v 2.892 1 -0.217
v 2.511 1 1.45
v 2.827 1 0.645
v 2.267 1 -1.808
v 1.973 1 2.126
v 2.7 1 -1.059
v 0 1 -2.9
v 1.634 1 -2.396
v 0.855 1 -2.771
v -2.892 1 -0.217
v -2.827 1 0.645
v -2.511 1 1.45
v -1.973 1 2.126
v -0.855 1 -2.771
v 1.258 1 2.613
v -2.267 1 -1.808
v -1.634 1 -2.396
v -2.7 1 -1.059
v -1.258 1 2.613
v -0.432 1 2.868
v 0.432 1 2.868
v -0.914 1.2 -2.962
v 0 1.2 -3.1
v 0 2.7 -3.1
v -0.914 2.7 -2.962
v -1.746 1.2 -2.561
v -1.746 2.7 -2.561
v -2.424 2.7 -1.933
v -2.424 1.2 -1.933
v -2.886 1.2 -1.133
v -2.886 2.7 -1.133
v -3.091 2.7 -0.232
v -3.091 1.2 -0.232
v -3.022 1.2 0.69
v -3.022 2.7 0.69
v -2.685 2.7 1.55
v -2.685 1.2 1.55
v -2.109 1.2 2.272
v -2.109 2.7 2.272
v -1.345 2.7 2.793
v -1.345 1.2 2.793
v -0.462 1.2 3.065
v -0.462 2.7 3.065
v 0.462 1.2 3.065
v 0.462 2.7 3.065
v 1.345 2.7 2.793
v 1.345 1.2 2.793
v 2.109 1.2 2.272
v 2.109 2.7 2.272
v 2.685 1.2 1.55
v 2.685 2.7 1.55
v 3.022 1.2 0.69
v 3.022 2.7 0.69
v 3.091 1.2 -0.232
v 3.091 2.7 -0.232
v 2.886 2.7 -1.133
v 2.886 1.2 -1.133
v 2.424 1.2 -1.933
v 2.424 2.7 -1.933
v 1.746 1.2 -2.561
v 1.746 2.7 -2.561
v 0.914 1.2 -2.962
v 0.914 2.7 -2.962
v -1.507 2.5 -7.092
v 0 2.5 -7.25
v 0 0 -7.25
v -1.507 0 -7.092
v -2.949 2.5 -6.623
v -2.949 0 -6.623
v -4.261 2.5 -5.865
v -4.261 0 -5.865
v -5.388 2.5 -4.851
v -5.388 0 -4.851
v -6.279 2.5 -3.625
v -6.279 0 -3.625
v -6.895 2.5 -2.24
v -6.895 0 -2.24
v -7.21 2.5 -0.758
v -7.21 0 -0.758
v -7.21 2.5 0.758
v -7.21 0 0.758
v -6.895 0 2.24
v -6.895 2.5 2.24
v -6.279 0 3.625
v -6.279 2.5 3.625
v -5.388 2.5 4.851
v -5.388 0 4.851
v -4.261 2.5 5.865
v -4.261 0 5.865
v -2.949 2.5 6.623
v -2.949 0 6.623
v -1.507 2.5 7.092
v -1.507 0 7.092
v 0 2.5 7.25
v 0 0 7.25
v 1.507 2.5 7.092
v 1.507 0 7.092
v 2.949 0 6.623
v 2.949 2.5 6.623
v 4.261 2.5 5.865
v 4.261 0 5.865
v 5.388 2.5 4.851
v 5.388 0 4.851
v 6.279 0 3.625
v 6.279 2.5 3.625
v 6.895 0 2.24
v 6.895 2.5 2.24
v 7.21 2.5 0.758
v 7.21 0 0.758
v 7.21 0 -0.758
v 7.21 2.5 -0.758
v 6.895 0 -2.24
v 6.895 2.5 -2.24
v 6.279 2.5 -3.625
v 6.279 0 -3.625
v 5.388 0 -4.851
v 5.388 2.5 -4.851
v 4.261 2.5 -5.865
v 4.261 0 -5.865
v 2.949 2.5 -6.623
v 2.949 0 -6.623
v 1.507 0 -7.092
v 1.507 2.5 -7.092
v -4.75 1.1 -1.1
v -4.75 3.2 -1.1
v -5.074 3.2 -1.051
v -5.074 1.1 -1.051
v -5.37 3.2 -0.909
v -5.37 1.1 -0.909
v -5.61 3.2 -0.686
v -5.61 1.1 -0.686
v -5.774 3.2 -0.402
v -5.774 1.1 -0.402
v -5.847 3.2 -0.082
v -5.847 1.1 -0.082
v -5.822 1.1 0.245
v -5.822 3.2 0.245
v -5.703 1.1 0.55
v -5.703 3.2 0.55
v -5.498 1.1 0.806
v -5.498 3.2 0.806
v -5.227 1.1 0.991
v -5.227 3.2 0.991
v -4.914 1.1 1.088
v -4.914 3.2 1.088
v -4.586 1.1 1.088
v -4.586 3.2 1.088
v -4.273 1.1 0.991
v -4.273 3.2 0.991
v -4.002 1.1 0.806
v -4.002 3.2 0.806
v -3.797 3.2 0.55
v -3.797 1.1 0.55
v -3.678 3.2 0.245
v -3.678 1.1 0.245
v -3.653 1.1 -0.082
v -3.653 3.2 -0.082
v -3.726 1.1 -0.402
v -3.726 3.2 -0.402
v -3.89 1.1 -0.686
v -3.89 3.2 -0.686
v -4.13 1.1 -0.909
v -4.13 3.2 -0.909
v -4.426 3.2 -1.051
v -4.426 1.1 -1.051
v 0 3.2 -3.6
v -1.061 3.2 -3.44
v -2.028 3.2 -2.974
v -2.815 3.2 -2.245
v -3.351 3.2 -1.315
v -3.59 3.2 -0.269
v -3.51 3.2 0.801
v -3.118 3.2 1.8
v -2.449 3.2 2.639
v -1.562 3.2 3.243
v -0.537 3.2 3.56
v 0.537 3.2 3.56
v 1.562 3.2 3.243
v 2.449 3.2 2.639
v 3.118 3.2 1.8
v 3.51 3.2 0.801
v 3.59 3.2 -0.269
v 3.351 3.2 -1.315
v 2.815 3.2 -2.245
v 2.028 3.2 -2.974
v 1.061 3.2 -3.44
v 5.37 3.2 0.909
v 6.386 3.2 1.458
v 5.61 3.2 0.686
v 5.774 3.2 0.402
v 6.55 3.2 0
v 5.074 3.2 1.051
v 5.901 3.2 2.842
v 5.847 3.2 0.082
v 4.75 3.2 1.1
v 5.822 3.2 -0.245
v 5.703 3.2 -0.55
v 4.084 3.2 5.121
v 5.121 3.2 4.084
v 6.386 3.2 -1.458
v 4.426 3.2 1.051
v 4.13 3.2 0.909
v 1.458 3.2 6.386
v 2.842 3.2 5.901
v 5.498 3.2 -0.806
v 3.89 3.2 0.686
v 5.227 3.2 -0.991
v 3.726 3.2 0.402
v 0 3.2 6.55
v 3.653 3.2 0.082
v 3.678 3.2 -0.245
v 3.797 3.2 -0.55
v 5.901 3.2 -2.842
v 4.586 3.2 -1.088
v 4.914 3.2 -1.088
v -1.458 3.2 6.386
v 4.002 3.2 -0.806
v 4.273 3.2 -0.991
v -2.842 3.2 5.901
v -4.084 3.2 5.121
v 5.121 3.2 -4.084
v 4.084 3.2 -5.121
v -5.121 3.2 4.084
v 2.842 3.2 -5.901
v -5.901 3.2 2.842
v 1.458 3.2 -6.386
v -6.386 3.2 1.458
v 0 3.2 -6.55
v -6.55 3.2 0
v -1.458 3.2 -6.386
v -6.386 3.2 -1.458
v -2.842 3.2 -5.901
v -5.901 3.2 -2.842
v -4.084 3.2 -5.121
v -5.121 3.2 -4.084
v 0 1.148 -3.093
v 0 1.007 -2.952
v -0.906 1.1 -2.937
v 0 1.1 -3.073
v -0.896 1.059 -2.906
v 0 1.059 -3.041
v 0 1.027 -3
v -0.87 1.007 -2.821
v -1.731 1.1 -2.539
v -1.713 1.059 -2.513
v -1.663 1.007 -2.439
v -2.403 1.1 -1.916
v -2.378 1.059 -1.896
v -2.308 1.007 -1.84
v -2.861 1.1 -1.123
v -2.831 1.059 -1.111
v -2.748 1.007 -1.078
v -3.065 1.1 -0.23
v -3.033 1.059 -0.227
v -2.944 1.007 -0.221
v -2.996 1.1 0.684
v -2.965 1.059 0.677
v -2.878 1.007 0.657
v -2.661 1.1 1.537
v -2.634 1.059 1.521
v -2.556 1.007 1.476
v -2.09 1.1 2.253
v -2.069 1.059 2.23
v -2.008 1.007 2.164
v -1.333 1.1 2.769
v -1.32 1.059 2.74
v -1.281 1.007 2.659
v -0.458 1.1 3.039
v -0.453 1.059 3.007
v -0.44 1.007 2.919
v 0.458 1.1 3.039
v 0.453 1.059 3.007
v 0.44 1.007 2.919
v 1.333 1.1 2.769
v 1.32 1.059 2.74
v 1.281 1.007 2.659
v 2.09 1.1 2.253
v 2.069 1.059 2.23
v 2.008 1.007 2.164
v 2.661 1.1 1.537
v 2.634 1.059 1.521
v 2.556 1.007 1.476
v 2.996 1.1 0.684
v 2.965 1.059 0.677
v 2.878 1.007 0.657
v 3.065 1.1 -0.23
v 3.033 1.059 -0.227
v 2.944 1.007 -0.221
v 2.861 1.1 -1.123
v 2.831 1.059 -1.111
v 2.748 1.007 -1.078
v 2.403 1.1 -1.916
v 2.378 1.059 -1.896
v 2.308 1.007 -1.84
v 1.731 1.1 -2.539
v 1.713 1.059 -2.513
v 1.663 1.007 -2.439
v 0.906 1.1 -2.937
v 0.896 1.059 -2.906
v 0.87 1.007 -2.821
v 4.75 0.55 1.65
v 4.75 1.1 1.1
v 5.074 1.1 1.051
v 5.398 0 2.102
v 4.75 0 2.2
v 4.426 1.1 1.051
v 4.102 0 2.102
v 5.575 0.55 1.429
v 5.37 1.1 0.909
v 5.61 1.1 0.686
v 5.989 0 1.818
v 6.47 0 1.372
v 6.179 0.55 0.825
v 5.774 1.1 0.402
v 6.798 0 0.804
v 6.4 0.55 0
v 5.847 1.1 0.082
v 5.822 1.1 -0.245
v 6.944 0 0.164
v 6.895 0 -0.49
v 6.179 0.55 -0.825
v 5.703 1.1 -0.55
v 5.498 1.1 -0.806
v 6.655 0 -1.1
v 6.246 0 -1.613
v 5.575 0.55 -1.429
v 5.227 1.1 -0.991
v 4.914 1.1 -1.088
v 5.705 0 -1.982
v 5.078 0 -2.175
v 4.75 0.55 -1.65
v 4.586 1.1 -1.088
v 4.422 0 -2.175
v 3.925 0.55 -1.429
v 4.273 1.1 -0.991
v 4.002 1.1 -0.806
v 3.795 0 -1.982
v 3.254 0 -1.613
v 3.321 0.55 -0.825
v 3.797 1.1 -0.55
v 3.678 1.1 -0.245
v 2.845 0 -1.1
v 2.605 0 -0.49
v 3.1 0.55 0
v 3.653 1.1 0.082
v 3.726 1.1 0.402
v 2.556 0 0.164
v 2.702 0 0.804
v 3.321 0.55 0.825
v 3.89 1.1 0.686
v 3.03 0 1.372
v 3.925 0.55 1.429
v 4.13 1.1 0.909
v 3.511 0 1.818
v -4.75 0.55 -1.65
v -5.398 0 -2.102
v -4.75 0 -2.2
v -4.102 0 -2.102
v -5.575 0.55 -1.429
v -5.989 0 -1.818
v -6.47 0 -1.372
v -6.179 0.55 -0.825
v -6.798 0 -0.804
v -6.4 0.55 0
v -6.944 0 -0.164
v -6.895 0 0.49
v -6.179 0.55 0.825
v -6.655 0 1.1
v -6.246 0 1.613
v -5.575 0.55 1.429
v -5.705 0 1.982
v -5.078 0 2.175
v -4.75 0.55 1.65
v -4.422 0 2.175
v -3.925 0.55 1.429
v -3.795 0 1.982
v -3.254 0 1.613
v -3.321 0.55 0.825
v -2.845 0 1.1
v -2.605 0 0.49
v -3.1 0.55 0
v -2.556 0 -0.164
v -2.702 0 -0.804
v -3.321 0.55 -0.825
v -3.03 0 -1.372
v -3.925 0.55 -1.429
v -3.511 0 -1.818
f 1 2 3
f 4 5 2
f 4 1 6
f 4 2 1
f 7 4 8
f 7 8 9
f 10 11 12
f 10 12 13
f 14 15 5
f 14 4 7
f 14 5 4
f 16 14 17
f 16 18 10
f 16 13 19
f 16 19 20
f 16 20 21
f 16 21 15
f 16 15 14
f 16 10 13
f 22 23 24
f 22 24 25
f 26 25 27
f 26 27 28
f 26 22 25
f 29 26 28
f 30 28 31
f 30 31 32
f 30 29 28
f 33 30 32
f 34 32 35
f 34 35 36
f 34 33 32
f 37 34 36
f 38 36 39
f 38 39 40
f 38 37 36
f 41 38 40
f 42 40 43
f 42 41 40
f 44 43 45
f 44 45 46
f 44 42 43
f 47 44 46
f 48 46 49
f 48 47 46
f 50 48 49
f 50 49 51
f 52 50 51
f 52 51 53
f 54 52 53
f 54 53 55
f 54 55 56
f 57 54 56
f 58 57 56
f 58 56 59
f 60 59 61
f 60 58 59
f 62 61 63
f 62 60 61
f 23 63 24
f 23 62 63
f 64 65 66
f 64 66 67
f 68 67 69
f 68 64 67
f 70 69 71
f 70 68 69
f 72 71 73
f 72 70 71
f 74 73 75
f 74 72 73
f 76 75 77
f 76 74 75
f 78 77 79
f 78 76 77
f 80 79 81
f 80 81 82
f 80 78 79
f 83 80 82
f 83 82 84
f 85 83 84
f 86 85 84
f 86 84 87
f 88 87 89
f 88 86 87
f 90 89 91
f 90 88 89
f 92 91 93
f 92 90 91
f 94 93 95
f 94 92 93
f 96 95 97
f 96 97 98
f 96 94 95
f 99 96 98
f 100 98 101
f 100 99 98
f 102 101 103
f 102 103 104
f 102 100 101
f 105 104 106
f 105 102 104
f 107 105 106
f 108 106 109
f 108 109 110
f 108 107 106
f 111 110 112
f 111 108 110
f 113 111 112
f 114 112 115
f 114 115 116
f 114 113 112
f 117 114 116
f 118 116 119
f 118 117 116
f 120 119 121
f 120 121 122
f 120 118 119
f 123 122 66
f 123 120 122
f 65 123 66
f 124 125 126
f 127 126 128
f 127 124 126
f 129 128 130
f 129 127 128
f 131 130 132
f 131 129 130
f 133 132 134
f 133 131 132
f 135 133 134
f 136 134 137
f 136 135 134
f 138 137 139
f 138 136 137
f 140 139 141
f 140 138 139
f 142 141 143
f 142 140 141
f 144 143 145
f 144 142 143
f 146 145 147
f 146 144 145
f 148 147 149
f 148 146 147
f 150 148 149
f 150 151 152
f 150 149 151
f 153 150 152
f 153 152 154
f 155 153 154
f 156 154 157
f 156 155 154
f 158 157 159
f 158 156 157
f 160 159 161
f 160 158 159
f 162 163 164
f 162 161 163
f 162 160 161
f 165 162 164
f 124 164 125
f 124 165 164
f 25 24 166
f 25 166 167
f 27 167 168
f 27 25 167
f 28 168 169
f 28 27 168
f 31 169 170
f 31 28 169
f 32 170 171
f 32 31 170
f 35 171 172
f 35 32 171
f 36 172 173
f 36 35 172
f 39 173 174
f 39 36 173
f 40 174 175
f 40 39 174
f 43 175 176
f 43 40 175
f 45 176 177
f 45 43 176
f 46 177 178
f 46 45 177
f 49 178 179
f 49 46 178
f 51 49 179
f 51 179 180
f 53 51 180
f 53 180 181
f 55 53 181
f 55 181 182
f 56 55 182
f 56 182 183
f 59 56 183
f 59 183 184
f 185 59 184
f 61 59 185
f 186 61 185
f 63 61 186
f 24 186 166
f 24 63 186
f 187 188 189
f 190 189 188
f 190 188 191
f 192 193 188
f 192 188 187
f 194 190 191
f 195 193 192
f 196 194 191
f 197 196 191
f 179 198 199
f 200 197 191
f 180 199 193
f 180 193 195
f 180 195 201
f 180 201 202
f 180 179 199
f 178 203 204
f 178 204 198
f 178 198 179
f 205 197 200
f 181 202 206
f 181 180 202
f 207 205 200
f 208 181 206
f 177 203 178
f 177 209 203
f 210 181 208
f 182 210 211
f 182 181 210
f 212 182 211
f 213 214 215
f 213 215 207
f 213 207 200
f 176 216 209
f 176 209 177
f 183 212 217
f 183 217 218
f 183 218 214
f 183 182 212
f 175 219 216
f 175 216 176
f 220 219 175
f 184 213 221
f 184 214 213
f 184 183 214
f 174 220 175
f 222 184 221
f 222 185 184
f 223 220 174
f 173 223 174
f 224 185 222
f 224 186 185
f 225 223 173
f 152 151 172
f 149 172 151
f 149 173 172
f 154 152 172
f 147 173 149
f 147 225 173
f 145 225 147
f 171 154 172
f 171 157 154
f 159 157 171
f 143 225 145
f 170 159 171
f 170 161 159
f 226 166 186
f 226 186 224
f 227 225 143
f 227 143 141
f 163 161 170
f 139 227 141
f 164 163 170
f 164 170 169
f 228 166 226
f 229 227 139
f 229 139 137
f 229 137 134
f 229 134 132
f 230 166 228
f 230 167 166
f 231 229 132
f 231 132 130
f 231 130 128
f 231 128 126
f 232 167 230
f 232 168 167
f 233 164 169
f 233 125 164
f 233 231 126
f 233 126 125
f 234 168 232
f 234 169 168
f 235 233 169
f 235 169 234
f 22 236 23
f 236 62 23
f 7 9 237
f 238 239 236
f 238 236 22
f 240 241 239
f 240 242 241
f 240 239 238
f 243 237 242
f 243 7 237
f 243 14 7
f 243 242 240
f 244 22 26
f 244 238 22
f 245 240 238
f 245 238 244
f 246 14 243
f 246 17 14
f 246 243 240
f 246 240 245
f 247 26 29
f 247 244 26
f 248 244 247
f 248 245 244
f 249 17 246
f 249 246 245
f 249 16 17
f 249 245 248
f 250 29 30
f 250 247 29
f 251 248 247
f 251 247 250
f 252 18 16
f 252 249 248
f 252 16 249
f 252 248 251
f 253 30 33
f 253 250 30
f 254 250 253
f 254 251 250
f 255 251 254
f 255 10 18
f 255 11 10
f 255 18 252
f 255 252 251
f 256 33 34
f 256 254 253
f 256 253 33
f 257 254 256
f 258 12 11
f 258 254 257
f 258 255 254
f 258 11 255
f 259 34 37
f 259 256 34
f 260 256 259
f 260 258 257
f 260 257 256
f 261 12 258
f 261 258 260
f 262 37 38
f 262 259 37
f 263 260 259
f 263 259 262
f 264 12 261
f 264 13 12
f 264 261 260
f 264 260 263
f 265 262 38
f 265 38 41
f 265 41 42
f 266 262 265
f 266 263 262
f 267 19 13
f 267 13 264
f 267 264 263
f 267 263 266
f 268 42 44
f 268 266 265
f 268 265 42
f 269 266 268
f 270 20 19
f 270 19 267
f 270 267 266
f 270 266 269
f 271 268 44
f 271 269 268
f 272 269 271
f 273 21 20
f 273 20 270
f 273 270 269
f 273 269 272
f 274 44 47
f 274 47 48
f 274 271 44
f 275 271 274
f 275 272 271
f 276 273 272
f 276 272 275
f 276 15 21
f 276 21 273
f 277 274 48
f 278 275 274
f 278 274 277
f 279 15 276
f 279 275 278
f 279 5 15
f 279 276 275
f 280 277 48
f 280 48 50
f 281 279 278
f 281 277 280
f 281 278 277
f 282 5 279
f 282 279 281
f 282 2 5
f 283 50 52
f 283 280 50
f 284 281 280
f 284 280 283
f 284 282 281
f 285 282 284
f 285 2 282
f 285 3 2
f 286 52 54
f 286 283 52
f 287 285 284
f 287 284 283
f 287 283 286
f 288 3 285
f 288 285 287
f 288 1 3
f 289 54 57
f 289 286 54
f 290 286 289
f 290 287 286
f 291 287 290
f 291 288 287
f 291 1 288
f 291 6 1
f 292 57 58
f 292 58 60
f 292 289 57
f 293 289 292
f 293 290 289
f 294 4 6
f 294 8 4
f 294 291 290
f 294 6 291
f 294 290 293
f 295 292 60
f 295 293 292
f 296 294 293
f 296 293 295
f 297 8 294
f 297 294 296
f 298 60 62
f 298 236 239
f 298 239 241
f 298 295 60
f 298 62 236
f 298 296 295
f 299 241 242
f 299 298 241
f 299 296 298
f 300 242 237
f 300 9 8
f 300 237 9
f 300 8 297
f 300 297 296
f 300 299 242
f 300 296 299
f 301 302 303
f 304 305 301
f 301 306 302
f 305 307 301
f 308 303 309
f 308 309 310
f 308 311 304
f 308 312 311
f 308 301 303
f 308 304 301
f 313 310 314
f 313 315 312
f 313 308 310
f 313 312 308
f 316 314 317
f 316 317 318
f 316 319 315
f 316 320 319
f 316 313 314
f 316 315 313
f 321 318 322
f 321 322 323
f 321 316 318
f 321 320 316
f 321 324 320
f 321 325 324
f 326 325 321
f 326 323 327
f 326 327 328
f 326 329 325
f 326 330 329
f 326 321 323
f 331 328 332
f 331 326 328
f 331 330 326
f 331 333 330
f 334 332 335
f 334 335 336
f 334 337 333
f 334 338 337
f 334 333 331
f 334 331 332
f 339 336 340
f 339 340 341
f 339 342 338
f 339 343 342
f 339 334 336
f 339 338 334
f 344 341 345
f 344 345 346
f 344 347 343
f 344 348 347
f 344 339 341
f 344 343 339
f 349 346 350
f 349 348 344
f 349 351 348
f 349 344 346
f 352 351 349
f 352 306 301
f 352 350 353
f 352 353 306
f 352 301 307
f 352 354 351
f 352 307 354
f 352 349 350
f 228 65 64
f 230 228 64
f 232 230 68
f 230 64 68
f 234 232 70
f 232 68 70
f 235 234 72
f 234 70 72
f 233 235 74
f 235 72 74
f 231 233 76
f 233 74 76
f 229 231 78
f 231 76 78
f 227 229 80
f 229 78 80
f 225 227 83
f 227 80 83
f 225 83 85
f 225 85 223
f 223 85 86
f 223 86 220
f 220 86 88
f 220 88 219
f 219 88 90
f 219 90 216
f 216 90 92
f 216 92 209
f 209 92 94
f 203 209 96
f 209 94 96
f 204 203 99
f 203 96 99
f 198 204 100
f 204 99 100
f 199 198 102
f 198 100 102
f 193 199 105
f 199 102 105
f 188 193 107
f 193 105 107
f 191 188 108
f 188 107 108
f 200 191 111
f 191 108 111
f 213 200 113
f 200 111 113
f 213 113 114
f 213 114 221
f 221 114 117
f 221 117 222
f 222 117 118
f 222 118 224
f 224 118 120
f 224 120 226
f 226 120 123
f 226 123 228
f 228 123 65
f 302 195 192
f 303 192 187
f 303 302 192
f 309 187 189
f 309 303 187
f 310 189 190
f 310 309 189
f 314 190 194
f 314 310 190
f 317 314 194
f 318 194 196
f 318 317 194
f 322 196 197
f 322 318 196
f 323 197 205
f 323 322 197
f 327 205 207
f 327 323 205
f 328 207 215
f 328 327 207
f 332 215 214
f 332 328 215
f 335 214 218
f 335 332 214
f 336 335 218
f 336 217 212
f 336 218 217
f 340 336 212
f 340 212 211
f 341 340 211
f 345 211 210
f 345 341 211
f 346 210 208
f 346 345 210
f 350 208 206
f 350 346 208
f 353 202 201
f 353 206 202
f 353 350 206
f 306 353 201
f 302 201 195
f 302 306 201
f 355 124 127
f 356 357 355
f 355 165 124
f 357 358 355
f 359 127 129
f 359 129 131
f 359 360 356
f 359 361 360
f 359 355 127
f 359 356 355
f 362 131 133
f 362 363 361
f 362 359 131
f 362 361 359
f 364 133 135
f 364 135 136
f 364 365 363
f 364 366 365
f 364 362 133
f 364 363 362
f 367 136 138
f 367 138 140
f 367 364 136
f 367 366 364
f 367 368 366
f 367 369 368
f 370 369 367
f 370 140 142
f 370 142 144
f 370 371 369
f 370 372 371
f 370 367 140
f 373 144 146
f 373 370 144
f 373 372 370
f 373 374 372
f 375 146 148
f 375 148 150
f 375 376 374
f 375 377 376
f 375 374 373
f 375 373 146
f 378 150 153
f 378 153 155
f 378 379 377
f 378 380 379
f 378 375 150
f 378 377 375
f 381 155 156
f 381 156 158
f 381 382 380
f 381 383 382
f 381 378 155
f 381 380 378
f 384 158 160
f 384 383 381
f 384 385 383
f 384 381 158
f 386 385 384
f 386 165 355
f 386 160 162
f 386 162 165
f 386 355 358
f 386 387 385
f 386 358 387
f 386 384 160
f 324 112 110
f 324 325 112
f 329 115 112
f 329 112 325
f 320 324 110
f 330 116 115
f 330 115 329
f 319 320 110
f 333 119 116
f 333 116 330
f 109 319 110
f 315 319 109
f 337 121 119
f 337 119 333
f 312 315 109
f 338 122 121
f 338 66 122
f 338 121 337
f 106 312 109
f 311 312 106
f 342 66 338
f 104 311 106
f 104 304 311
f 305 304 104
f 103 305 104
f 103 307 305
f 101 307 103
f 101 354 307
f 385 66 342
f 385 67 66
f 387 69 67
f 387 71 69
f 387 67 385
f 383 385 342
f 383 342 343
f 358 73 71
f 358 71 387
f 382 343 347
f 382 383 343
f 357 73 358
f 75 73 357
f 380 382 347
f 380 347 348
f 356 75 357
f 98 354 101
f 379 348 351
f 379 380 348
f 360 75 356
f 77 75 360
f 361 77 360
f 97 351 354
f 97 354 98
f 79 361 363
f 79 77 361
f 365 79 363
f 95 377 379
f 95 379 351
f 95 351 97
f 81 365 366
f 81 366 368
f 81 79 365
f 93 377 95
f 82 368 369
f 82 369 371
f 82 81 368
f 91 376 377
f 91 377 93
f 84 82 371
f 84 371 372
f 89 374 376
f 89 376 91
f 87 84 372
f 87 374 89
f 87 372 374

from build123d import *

# Parameters (mm, degrees)
CHAMFER2_SIZE     = 0.5
CIRPATTERN1_COUNT = 2
CHAMFER3_SIZE     = 0.7
FILLET2_R         = 0.2


with BuildPart() as part:
    # Sketch1 → Revolve1 (revolve)
    with BuildSketch(Plane.XY, mode=Mode.PRIVATE) as revolve1_sk:
        Polygon((0, 0), (-7.25, 0), (-7.25, 3.2), (-3.1, 3.2), (-3.1, 1), (0, 1), align=None)
    revolve(revolve1_sk.sketch.rotate(Axis((0, 0, 0), (0, 1, 0)), 270), axis=Axis((0, 0, 0), (0, 1, 0)))

    # Chamfer2
    chamfer2_edges = [part.edges().sort_by_distance(p)[0] for p in [
        (0, 3.2, 3.1),
    ]]
    chamfer(chamfer2_edges, length=CHAMFER2_SIZE)

    # Sketch4 → CSK for M2 Flat Head Machine Screw1 (revolve, cut)
    with BuildSketch(Plane(origin=(-4.75, 0, 0), x_dir=(0, 0, -1), z_dir=(1, 0, 0))):
        Polygon((0, 0), (0, 5.660946681), (1.1, 5), (1.1, 1.1), (2.2, 0), align=None)
    csk_for_m2_flat_head_machine_screw1 = revolve(axis=Axis((-4.75, -6.35, 0), (0, 1, 0)), mode=Mode.SUBTRACT)

    # CirPattern1: CSK for M2 Flat Head Machine Screw1 ×2 about axis
    cirpattern1_axis = Axis((0, 0, 0), (0, 1, 0))
    for i in range(1, CIRPATTERN1_COUNT):
        add(csk_for_m2_flat_head_machine_screw1.rotate(cirpattern1_axis, i * 360 / CIRPATTERN1_COUNT), mode=Mode.SUBTRACT)

    # Chamfer3
    chamfer3_edges = [part.edges().sort_by_distance(p)[0] for p in [
        (0, 3.2, 7.25),
    ]]
    chamfer(chamfer3_edges, length=CHAMFER3_SIZE)

    # Fillet2
    fillet2_edges = [part.edges().sort_by_distance(p)[0] for p in [
        (0, 1, 3.1),
    ]]
    fillet(fillet2_edges, radius=FILLET2_R)


solid = part.part
